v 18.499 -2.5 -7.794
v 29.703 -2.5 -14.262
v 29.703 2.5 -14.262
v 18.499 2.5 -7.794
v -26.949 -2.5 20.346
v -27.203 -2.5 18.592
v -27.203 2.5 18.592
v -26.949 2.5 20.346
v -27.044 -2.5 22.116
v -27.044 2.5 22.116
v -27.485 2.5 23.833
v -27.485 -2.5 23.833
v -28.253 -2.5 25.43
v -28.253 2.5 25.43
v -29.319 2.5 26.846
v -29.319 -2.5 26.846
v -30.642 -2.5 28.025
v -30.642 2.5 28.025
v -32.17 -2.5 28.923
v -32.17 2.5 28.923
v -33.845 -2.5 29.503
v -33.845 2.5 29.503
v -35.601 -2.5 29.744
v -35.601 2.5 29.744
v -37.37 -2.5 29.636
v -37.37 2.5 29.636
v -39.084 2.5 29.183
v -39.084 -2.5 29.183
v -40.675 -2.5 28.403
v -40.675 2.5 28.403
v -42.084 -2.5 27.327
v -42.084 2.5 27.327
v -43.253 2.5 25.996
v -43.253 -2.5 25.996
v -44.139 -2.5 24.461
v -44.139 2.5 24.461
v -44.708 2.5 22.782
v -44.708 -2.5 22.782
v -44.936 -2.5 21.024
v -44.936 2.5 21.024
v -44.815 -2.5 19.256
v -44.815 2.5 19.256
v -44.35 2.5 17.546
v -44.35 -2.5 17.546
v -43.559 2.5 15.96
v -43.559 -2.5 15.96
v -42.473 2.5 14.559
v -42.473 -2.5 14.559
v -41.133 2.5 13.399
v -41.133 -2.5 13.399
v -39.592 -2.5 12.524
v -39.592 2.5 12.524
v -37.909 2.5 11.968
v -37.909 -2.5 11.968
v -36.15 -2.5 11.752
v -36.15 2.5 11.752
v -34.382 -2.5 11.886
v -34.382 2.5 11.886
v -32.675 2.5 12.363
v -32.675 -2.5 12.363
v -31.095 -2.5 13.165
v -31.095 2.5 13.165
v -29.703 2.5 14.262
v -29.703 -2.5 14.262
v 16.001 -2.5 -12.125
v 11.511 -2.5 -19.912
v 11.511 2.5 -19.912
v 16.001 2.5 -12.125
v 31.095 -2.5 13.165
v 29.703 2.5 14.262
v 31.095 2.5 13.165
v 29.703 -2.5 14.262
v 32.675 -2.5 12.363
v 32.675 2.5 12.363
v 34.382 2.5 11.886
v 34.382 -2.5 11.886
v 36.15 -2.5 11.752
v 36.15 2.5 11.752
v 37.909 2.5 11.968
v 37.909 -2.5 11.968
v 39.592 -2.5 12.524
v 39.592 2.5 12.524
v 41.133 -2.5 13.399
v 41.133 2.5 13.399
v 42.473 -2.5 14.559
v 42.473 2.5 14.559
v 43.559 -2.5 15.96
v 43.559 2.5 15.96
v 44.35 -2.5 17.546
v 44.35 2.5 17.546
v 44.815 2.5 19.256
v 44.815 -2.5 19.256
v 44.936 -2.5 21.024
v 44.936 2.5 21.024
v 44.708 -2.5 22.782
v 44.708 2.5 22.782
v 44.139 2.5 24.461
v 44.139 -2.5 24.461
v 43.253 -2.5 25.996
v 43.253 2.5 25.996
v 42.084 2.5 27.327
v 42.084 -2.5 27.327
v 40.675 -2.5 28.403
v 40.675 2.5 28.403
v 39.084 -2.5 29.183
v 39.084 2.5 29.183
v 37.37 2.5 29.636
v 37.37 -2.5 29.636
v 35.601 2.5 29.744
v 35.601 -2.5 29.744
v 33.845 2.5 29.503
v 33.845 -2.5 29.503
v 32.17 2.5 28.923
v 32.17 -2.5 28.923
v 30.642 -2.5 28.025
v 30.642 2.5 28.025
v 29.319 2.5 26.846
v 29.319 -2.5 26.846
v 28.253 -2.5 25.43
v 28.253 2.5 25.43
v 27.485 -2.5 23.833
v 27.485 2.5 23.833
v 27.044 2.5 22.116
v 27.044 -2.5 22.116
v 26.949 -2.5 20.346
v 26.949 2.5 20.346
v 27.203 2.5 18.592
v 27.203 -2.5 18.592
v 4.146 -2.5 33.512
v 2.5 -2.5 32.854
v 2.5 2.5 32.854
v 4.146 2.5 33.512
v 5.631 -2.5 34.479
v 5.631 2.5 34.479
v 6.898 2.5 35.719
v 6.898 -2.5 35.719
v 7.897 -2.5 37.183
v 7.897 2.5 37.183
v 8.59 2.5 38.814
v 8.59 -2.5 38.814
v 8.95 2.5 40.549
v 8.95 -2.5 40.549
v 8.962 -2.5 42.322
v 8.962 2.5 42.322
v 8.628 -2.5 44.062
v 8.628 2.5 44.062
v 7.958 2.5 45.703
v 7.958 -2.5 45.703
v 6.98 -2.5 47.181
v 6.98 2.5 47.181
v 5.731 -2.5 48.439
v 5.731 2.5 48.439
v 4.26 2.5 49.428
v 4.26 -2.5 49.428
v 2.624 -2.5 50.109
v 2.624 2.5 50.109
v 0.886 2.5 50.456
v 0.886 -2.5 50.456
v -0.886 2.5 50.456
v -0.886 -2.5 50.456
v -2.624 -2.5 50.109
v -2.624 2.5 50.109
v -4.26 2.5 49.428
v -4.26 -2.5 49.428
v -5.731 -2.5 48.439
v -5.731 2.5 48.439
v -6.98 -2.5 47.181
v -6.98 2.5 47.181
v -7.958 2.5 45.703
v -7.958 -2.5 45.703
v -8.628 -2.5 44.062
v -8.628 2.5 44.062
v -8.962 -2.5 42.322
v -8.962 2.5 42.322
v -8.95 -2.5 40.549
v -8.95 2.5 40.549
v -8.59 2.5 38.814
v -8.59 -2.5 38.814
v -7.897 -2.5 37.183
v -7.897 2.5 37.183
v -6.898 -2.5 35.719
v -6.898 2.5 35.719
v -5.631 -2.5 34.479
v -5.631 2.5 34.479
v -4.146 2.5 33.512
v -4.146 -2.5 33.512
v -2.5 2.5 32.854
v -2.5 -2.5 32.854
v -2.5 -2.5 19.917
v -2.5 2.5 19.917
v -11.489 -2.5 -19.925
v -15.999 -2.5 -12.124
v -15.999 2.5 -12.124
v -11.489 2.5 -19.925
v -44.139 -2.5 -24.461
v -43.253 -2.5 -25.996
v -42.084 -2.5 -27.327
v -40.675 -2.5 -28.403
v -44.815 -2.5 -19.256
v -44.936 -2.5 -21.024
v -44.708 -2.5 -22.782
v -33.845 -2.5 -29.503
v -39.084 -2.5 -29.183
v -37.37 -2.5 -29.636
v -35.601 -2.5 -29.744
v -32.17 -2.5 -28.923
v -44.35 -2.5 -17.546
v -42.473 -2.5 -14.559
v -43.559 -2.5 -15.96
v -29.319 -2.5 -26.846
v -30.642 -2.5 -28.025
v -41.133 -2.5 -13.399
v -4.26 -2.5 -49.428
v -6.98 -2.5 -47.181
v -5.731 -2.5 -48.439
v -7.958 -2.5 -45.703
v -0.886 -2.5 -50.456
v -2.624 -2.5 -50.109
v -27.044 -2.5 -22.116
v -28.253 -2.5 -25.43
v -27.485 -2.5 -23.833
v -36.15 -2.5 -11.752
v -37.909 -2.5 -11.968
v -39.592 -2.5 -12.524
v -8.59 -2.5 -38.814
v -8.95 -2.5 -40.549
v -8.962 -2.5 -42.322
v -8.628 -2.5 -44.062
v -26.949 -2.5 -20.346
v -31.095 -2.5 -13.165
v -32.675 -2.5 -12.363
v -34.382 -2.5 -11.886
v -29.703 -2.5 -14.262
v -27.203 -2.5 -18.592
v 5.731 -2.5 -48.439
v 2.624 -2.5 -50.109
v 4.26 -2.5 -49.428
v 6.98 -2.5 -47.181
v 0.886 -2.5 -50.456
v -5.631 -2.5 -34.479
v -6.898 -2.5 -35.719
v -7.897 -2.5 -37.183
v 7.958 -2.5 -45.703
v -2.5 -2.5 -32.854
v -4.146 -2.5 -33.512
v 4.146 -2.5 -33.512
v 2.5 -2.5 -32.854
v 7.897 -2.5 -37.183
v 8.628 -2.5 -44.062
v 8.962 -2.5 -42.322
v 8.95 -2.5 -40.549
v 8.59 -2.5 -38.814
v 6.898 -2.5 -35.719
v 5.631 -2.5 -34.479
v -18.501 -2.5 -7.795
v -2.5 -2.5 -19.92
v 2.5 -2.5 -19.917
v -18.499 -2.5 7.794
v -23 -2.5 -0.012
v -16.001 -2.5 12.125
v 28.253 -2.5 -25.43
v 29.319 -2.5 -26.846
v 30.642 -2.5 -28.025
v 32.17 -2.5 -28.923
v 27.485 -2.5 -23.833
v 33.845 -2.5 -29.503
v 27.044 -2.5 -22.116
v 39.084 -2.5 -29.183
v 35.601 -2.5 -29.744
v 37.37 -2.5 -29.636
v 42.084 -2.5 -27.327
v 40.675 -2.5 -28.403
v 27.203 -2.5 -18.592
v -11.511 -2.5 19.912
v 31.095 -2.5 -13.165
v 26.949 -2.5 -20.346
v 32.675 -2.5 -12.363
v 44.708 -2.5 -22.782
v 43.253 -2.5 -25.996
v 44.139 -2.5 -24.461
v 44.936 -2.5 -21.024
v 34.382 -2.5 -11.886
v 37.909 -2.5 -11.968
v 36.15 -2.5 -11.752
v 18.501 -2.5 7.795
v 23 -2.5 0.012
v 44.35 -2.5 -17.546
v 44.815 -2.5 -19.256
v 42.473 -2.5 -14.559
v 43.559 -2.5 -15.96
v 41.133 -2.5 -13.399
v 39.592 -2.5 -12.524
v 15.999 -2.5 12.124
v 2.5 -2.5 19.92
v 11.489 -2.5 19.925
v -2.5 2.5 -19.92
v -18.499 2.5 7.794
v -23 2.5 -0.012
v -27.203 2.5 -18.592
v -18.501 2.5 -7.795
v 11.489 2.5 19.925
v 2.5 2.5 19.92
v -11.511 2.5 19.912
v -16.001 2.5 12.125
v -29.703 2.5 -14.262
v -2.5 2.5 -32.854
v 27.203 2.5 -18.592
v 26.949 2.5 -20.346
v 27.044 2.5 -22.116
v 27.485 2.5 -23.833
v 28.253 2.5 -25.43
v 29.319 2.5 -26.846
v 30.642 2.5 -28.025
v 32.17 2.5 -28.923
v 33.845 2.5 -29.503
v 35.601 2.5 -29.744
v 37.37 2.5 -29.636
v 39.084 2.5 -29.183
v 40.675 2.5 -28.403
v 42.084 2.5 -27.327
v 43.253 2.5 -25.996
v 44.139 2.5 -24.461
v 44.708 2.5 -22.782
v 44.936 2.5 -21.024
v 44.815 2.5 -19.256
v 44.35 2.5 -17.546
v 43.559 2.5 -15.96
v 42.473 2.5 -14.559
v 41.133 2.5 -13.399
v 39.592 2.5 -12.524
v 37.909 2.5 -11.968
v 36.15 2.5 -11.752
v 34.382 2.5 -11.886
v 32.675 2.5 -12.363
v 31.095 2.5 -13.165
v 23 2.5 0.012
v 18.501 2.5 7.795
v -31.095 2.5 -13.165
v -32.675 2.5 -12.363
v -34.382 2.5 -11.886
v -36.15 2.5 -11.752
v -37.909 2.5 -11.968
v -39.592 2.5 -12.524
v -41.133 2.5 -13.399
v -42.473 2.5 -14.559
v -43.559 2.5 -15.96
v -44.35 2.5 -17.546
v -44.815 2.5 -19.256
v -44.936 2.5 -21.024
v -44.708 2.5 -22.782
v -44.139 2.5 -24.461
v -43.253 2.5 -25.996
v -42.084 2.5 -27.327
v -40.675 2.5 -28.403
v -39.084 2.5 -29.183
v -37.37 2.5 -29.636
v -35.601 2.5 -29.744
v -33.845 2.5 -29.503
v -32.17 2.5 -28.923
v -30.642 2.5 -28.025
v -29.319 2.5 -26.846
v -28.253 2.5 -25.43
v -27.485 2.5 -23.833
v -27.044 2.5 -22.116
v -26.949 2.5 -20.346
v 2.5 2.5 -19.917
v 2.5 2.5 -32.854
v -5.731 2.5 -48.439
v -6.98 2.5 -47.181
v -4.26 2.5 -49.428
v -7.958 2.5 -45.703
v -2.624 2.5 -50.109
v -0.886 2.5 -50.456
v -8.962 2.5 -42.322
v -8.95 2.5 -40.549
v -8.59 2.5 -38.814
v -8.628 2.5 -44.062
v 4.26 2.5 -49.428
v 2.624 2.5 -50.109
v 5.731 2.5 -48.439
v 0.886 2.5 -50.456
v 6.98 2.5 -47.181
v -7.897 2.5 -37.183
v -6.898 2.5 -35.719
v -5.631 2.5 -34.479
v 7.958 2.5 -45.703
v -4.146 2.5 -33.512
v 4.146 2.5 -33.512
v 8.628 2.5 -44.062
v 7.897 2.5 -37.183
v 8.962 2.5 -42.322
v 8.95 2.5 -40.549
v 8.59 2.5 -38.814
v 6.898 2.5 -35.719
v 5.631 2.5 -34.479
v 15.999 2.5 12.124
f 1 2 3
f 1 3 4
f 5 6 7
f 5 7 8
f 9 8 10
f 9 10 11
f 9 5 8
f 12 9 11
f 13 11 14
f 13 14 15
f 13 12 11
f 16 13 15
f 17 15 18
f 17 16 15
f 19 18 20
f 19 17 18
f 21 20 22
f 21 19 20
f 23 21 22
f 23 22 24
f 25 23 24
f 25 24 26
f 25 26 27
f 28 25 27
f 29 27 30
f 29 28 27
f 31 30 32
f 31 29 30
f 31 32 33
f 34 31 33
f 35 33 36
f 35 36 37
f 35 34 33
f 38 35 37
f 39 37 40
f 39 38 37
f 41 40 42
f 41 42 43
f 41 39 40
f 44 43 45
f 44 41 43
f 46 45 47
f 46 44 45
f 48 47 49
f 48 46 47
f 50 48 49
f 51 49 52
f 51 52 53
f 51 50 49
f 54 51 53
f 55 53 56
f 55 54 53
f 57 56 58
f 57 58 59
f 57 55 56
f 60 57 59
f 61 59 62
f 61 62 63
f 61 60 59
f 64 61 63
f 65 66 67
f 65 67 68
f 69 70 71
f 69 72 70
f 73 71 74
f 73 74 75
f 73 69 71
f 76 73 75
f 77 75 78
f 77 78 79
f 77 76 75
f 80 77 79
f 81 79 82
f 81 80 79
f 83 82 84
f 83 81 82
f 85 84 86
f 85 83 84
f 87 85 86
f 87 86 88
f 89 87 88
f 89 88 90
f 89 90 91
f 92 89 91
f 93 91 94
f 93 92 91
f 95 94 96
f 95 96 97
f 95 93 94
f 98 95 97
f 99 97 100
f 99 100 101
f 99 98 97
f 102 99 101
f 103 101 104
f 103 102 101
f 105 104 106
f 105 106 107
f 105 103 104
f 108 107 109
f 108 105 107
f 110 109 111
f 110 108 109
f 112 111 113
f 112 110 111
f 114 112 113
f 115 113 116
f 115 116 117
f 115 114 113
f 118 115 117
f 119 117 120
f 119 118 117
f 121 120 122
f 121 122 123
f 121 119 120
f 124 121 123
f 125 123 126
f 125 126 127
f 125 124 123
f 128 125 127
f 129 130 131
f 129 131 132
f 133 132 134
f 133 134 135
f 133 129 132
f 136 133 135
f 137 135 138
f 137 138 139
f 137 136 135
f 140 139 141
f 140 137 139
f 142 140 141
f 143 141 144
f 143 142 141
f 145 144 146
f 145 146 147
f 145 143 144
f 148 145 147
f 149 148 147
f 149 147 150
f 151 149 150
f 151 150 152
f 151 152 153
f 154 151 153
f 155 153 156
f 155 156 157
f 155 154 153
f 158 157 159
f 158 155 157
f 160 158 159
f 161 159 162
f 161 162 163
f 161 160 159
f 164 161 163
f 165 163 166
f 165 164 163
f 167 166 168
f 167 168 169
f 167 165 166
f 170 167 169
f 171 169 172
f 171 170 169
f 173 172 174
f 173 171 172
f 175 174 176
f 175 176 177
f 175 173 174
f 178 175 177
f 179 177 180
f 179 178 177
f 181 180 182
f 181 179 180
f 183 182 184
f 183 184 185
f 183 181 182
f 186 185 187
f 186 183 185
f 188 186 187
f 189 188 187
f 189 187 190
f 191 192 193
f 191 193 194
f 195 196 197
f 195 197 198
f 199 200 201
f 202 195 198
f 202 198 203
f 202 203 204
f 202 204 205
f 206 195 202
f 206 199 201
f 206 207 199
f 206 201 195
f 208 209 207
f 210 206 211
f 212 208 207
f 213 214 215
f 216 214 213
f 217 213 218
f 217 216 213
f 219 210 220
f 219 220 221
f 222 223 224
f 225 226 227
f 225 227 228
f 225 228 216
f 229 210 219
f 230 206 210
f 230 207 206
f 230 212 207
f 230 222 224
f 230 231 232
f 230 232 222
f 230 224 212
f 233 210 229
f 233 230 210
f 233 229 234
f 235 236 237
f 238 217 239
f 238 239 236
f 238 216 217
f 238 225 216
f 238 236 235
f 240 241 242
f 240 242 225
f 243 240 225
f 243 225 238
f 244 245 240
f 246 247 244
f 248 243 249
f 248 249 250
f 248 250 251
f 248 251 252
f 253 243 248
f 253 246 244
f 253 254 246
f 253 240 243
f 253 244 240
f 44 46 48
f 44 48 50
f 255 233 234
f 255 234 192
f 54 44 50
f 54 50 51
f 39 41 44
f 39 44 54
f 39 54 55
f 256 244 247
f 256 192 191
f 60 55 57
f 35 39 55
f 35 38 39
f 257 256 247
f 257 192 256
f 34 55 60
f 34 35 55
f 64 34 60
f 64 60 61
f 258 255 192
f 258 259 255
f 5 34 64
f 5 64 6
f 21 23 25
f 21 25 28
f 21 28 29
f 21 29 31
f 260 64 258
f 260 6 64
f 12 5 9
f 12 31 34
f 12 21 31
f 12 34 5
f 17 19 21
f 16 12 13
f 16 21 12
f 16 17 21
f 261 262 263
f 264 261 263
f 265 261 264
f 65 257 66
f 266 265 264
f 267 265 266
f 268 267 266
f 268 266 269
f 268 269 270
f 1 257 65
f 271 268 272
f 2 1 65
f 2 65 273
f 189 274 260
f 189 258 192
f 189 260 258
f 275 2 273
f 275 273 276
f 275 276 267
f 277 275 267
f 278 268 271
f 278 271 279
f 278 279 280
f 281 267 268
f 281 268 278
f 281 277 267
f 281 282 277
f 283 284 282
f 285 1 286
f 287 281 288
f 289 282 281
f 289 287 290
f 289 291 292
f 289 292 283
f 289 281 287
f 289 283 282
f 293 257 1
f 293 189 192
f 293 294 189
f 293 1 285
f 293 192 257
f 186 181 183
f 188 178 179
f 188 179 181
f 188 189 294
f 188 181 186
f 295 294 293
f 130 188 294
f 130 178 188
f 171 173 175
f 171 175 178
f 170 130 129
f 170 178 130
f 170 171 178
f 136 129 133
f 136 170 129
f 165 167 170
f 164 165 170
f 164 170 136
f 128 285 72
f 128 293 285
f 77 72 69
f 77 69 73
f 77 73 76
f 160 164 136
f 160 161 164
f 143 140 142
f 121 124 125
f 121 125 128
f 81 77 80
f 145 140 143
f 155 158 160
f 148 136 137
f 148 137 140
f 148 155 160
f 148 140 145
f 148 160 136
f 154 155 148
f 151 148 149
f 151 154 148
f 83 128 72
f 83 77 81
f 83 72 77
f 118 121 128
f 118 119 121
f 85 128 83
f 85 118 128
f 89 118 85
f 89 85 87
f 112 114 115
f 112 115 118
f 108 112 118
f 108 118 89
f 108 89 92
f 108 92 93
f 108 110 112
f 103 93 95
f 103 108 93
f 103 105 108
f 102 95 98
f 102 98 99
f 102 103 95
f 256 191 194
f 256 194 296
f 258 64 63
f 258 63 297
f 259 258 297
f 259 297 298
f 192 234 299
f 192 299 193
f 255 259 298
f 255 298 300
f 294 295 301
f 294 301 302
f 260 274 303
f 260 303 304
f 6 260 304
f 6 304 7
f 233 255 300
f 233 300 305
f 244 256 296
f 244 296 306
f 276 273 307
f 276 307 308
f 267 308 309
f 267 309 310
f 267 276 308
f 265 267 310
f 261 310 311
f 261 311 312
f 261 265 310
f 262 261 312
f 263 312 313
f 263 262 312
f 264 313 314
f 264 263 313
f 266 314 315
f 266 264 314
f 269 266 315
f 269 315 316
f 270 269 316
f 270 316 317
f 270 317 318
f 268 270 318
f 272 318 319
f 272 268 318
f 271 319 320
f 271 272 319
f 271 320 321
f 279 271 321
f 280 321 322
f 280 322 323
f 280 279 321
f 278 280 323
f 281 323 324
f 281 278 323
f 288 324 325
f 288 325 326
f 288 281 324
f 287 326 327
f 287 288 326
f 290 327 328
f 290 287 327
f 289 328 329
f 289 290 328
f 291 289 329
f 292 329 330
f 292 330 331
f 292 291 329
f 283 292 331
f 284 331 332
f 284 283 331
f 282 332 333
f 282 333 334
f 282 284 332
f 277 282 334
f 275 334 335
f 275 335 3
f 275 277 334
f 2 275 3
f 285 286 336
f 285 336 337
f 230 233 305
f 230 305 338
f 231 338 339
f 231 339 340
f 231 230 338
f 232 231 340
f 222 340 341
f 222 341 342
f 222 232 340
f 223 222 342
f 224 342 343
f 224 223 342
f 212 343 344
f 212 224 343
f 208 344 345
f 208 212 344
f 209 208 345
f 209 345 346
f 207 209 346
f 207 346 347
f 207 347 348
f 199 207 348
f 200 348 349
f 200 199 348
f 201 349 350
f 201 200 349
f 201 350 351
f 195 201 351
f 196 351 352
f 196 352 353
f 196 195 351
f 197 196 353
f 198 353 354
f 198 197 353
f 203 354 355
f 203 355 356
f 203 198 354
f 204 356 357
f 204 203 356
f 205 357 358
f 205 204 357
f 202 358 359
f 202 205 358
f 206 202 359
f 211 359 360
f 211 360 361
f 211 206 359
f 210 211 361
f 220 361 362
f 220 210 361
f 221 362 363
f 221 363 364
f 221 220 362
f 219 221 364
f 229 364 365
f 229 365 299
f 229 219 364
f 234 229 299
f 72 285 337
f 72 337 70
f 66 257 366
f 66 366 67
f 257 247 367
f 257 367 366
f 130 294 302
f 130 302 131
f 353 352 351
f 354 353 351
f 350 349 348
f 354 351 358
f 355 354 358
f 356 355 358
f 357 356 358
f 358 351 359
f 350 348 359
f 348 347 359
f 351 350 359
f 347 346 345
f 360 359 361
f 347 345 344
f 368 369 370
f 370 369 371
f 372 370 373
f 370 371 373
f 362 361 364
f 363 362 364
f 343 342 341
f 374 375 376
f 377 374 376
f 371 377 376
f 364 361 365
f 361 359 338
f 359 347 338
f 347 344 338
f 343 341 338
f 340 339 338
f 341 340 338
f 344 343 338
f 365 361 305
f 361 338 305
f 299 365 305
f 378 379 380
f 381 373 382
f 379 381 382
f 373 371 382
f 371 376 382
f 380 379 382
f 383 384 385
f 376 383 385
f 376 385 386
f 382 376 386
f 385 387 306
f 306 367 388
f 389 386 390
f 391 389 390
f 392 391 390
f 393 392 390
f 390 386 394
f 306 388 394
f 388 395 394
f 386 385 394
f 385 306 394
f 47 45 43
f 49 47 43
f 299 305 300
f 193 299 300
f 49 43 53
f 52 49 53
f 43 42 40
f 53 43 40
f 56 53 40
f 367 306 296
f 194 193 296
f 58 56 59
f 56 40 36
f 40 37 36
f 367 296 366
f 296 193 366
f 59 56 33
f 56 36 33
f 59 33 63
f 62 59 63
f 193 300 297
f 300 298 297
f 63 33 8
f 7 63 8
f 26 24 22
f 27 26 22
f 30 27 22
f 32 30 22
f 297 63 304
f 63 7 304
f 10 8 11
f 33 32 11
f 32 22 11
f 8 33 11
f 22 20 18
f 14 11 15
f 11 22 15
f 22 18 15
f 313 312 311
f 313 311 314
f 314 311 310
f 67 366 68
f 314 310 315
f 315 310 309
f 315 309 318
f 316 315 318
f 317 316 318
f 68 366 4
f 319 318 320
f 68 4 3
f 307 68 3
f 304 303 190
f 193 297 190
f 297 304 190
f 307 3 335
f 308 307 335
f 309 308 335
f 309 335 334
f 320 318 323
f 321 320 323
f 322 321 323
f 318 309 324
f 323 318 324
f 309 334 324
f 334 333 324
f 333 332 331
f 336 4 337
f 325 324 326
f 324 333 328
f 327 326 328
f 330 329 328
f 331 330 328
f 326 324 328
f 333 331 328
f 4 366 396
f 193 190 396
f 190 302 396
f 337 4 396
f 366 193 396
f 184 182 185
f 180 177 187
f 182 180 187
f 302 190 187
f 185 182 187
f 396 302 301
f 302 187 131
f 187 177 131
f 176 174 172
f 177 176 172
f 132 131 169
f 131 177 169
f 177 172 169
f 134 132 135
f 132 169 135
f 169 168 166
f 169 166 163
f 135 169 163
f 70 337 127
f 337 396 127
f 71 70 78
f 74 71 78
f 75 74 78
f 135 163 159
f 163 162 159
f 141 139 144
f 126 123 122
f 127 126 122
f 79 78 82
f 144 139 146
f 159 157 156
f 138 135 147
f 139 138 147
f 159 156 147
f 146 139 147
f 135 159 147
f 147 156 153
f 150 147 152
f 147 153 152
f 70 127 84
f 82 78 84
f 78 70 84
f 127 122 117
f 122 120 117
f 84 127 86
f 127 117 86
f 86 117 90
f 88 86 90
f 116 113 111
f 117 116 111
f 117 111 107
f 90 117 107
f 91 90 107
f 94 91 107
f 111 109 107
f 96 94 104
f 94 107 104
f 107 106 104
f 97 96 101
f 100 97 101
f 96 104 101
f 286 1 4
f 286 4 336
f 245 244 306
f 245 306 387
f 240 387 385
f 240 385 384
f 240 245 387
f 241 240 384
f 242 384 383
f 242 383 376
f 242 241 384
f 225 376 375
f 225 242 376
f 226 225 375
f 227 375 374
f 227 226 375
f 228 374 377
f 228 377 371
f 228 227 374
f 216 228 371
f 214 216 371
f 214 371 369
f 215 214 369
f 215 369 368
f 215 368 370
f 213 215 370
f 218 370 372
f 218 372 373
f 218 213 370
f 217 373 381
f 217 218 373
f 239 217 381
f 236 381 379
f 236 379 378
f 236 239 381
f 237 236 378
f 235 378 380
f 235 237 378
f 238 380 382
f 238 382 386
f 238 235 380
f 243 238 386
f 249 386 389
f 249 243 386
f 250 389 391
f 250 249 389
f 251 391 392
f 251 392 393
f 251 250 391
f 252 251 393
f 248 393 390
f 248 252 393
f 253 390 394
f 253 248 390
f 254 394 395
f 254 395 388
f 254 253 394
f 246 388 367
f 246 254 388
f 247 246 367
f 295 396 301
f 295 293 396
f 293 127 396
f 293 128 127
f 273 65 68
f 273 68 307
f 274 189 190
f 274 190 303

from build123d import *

# Parameters (mm, degrees)
F1_DEPTH = 2.5


with BuildPart() as f1:
    # F0 (on Front) → F1 (new body, symmetric)
    with BuildSketch(Plane.XZ):
        with BuildLine():
            Line((15.998854, 12.123694), (11.489416, 19.924695))
            Line((11.489416, 19.924695), (2.5, 19.919918))
            Line((2.5, 19.919918), (2.5, 32.854192))
            ThreePointArc((2.5, 32.854192), (0, 50.5), (-2.5, 32.854192))
            Line((-2.5, 32.854192), (-2.5, 19.917261))
            Line((-2.5, 19.917261), (-11.510584, 19.912474))
            Line((-11.510584, 19.912474), (-16.001155, 12.125023))
            Line((-16.001155, 12.125023), (-27.202565, 18.592159))
            ThreePointArc((-27.202565, 18.592159), (-43.734283, 25.25), (-29.702565, 14.262032))
            Line((-29.702565, 14.262032), (-18.498854, 7.793567))
            Line((-18.498854, 7.793567), (-23, -0.012222))
            Line((-23, -0.012222), (-18.501155, -7.794896))
            Line((-18.501155, -7.794896), (-29.702565, -14.262032))
            ThreePointArc((-29.702565, -14.262032), (-43.734283, -25.25), (-27.202565, -18.592159))
            Line((-27.202565, -18.592159), (-15.998854, -12.123694))
            Line((-15.998854, -12.123694), (-11.489416, -19.924695))
            Line((-11.489416, -19.924695), (-2.5, -19.919918))
            Line((-2.5, -19.919918), (-2.5, -32.854192))
            ThreePointArc((-2.5, -32.854192), (0, -50.5), (2.5, -32.854192))
            Line((2.5, -32.854192), (2.5, -19.917261))
            Line((2.5, -19.917261), (11.510584, -19.912474))
            Line((11.510584, -19.912474), (16.001155, -12.125023))
            Line((16.001155, -12.125023), (27.202565, -18.592159))
            ThreePointArc((27.202565, -18.592159), (43.734283, -25.25), (29.702565, -14.262032))
            Line((29.702565, -14.262032), (18.498854, -7.793567))
            Line((18.498854, -7.793567), (23, 0.012222))
            Line((23, 0.012222), (18.501155, 7.794896))
            Line((18.501155, 7.794896), (29.702565, 14.262032))
            ThreePointArc((29.702565, 14.262032), (43.734283, 25.25), (27.202565, 18.592159))
            Line((27.202565, 18.592159), (15.998854, 12.123694))
        make_face()
    extrude(amount=F1_DEPTH, both=True)


solid = f1.part
